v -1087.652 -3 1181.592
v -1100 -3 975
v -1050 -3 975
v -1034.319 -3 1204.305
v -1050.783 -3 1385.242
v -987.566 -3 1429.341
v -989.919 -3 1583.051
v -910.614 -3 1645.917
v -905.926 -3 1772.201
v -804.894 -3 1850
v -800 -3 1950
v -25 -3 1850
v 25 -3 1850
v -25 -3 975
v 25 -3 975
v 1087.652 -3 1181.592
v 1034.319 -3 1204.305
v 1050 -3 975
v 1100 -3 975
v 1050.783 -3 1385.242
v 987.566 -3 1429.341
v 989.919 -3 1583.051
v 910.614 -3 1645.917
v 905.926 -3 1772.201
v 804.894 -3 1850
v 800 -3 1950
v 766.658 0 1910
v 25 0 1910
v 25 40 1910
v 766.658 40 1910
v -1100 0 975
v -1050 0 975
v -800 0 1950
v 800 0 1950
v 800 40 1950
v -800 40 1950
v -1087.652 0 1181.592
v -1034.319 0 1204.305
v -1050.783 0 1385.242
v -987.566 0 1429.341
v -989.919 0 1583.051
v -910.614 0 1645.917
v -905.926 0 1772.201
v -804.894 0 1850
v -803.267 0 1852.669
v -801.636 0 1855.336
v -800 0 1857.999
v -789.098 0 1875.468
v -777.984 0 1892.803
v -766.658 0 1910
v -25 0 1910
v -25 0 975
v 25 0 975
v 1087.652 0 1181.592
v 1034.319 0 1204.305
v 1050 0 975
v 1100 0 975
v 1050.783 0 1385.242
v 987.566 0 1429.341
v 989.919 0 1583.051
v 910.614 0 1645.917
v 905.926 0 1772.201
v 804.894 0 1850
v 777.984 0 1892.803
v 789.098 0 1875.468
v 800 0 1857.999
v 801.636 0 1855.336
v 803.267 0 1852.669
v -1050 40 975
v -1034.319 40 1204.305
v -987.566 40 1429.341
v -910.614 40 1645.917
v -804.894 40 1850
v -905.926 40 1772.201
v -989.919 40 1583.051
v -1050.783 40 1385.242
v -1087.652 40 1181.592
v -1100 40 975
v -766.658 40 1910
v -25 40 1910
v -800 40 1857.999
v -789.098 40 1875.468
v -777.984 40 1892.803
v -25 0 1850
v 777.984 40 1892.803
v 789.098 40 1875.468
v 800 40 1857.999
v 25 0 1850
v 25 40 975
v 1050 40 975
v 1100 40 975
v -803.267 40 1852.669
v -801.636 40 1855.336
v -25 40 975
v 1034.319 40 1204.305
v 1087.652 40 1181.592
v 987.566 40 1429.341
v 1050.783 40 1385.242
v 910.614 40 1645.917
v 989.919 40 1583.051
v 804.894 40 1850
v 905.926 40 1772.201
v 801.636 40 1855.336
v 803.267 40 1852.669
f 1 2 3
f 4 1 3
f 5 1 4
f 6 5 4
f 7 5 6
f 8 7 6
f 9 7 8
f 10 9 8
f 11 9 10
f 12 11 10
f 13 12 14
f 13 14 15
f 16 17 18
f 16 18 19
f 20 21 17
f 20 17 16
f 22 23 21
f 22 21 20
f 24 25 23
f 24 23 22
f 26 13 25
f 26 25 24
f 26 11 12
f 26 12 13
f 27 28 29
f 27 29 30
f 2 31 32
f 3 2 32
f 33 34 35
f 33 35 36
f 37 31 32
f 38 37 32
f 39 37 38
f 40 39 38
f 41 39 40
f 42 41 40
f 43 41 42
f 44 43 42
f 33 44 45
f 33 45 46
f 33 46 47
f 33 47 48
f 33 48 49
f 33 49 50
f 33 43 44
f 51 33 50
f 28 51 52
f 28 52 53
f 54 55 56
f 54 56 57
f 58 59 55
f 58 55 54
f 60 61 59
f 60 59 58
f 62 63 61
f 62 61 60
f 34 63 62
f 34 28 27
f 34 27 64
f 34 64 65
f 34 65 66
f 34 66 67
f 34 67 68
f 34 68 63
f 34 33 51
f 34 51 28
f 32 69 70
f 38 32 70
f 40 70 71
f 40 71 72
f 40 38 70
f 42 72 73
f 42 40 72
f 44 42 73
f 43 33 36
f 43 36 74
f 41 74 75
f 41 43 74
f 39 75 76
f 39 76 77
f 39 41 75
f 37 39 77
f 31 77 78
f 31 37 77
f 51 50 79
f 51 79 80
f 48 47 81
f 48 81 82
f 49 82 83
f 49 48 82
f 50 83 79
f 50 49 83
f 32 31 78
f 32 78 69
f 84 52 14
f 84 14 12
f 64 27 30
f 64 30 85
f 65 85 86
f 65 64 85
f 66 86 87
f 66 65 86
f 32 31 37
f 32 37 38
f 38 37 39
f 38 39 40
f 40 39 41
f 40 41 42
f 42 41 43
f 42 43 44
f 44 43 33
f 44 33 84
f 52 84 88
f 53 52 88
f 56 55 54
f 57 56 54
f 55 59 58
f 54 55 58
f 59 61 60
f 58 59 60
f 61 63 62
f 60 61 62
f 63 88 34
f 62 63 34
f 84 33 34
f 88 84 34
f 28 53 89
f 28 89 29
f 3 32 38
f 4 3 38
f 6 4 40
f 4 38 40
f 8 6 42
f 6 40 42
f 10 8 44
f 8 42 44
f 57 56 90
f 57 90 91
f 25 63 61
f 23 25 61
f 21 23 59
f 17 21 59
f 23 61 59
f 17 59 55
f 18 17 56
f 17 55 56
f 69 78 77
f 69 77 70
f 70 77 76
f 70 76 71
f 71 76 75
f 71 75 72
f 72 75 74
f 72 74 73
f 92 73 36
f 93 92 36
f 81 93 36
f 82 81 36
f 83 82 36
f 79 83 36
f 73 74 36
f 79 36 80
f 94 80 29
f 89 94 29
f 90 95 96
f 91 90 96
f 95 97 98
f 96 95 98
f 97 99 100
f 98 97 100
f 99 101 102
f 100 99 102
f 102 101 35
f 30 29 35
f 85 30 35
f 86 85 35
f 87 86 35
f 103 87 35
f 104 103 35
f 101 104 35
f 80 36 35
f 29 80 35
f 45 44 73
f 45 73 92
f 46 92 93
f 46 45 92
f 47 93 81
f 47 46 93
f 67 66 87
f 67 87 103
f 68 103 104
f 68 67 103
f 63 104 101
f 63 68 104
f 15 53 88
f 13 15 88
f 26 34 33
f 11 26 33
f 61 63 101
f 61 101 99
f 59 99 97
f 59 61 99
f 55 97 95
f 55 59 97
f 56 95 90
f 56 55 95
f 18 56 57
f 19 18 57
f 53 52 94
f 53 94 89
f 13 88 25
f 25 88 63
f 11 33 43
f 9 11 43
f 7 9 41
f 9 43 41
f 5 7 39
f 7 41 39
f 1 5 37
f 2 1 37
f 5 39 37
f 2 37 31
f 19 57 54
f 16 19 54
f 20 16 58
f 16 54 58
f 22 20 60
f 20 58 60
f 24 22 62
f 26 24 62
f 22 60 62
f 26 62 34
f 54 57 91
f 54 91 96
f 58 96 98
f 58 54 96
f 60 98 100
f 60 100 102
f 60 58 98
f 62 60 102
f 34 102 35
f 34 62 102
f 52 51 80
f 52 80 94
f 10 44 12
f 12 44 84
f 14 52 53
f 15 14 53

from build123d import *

# Parameters (mm, degrees)
F0_W     = 25
F0_H     = 60
F1_DEPTH = 3
F2_DEPTH = 3
F0_H_2   = 875
F3_DEPTH = 3
F4_DEPTH = 3
F5_DEPTH = 40


with BuildPart() as f1:
    # F0 (on Front) → F1 (new body)
    with BuildSketch(Plane.XZ):
        with BuildLine():
            Line((-766.6582403712, 1910), (-800, 1910))
            Line((-800, 1910), (-800, 1857.9991506224))
            ThreePointArc((-800, 1857.9991506224), (-783.5675215696, 1884.152432846), (-766.6582403712, 1910))
        make_face()
        Polygon((0, 1950), (-800, 1950), (-800, 1910), (-766.6582403712, 1910), (-25, 1910), (0, 1910), align=None)
        Polygon((800, 1950), (0, 1950), (0, 1910), (25, 1910), (766.6582403712, 1910), (800, 1910), align=None)
        with BuildLine():
            Line((800, 1857.9991506224), (800, 1910))
            Line((800, 1910), (766.6582403712, 1910))
            ThreePointArc((766.6582403712, 1910), (783.5675215696, 1884.152432846), (800, 1857.9991506225))
        make_face()
        with Locations((-12.5, 1880)):
            Rectangle(F0_W, F0_H)
        with Locations((12.5, 1880)):
            Rectangle(F0_W, F0_H)
        with BuildLine():
            ThreePointArc((-766.6582403712, 1910), (-783.5675215696, 1884.152432846), (-800, 1857.9991506224))
            Line((-800, 1857.9991506224), (-800, 1850))
            Line((-800, 1850), (-25, 1850))
            Line((-25, 1850), (-25, 1910))
            Line((-25, 1910), (-766.6582403712, 1910))
        make_face()
        with BuildLine():
            Line((766.6582403712, 1910), (25, 1910))
            Line((25, 1910), (25, 1850))
            Line((25, 1850), (800, 1850))
            Line((800, 1850), (800, 1857.9991506224))
            ThreePointArc((800, 1857.9991506225), (783.5675215696, 1884.152432846), (766.6582403712, 1910))
        make_face()
    extrude(amount=F1_DEPTH)

    # F0 (on Front) → F2 (join)
    with BuildSketch(Plane.XZ):
        with BuildLine():
            Line((-800, 1910), (-800, 1950))
            ThreePointArc((-800, 1950), (-1023.3042182521, 1485.0551440776), (-1100, 975))
            Line((-1100, 975), (-1050, 975))
            ThreePointArc((-1050, 975), (-987.5663076307, 1429.340769936), (-804.8936130896, 1850))
            ThreePointArc((-804.8936130896, 1850), (-802.452373196, 1854.0029808024), (-800, 1857.9991506224))
            Line((-800, 1857.9991506224), (-800, 1910))
        make_face()
        with BuildLine():
            Line((-800, 1850), (-800, 1857.9991506224))
            ThreePointArc((-800, 1857.9991506224), (-802.452373196, 1854.0029808024), (-804.8936130896, 1850))
            Line((-804.8936130896, 1850), (-800, 1850))
        make_face()
    extrude(amount=F2_DEPTH)

    # F0 (on Front) → F3 (join)
    with BuildSketch(Plane.XZ):
        with Locations((-12.5, 1412.5)):
            Rectangle(F0_W, F0_H_2)
        with Locations((12.5, 1412.5)):
            Rectangle(F0_W, F0_H_2)
    extrude(amount=F3_DEPTH)

    # F0 (on Front) → F4 (join)
    with BuildSketch(Plane.XZ):
        with BuildLine():
            ThreePointArc((1100, 975), (1023.3042182521, 1485.0551440776), (800, 1950))
            Line((800, 1950), (800, 1910))
            Line((800, 1910), (800, 1857.9991506224))
            ThreePointArc((800, 1857.9991506225), (802.452373196, 1854.0029808024), (804.8936130897, 1850))
            ThreePointArc((804.8936130897, 1850), (987.5663076308, 1429.340769936), (1050, 975))
            Line((1050, 975), (1100, 975))
        make_face()
        with BuildLine():
            ThreePointArc((804.8936130897, 1850), (802.452373196, 1854.0029808024), (800, 1857.9991506225))
            Line((800, 1857.9991506224), (800, 1850))
            Line((800, 1850), (804.8936130896, 1850))
        make_face()
    extrude(amount=F4_DEPTH)


with BuildPart() as f5:
    # F0 (on Front) → F5 (new body)
    with BuildSketch(Plane.XZ):
        Polygon((0, 1950), (-800, 1950), (-800, 1910), (-766.6582403712, 1910), (-25, 1910), (0, 1910), align=None)
        with Locations((12.5, 1880)):
            Rectangle(F0_W, F0_H)
        with Locations((-12.5, 1880)):
            Rectangle(F0_W, F0_H)
        with Locations((-12.5, 1412.5)):
            Rectangle(F0_W, F0_H_2)
        with Locations((12.5, 1412.5)):
            Rectangle(F0_W, F0_H_2)
        with BuildLine():
            ThreePointArc((1100, 975), (1023.3042182521, 1485.0551440776), (800, 1950))
            Line((800, 1950), (800, 1910))
            Line((800, 1910), (800, 1857.9991506224))
            ThreePointArc((800, 1857.9991506225), (802.452373196, 1854.0029808024), (804.8936130897, 1850))
            ThreePointArc((804.8936130897, 1850), (987.5663076308, 1429.340769936), (1050, 975))
            Line((1050, 975), (1100, 975))
        make_face()
        with BuildLine():
            Line((-800, 1910), (-800, 1950))
            ThreePointArc((-800, 1950), (-1023.3042182521, 1485.0551440776), (-1100, 975))
            Line((-1100, 975), (-1050, 975))
            ThreePointArc((-1050, 975), (-987.5663076307, 1429.340769936), (-804.8936130896, 1850))
            ThreePointArc((-804.8936130896, 1850), (-802.452373196, 1854.0029808024), (-800, 1857.9991506224))
            Line((-800, 1857.9991506224), (-800, 1910))
        make_face()
        Polygon((800, 1950), (0, 1950), (0, 1910), (25, 1910), (766.6582403712, 1910), (800, 1910), align=None)
        with BuildLine():
            Line((800, 1857.9991506224), (800, 1910))
            Line((800, 1910), (766.6582403712, 1910))
            ThreePointArc((766.6582403712, 1910), (783.5675215696, 1884.152432846), (800, 1857.9991506225))
        make_face()
        with BuildLine():
            Line((-766.6582403712, 1910), (-800, 1910))
            Line((-800, 1910), (-800, 1857.9991506224))
            ThreePointArc((-800, 1857.9991506224), (-783.5675215696, 1884.152432846), (-766.6582403712, 1910))
        make_face()
    extrude(amount=-F5_DEPTH)


solid = Compound([f1.part, f5.part])
